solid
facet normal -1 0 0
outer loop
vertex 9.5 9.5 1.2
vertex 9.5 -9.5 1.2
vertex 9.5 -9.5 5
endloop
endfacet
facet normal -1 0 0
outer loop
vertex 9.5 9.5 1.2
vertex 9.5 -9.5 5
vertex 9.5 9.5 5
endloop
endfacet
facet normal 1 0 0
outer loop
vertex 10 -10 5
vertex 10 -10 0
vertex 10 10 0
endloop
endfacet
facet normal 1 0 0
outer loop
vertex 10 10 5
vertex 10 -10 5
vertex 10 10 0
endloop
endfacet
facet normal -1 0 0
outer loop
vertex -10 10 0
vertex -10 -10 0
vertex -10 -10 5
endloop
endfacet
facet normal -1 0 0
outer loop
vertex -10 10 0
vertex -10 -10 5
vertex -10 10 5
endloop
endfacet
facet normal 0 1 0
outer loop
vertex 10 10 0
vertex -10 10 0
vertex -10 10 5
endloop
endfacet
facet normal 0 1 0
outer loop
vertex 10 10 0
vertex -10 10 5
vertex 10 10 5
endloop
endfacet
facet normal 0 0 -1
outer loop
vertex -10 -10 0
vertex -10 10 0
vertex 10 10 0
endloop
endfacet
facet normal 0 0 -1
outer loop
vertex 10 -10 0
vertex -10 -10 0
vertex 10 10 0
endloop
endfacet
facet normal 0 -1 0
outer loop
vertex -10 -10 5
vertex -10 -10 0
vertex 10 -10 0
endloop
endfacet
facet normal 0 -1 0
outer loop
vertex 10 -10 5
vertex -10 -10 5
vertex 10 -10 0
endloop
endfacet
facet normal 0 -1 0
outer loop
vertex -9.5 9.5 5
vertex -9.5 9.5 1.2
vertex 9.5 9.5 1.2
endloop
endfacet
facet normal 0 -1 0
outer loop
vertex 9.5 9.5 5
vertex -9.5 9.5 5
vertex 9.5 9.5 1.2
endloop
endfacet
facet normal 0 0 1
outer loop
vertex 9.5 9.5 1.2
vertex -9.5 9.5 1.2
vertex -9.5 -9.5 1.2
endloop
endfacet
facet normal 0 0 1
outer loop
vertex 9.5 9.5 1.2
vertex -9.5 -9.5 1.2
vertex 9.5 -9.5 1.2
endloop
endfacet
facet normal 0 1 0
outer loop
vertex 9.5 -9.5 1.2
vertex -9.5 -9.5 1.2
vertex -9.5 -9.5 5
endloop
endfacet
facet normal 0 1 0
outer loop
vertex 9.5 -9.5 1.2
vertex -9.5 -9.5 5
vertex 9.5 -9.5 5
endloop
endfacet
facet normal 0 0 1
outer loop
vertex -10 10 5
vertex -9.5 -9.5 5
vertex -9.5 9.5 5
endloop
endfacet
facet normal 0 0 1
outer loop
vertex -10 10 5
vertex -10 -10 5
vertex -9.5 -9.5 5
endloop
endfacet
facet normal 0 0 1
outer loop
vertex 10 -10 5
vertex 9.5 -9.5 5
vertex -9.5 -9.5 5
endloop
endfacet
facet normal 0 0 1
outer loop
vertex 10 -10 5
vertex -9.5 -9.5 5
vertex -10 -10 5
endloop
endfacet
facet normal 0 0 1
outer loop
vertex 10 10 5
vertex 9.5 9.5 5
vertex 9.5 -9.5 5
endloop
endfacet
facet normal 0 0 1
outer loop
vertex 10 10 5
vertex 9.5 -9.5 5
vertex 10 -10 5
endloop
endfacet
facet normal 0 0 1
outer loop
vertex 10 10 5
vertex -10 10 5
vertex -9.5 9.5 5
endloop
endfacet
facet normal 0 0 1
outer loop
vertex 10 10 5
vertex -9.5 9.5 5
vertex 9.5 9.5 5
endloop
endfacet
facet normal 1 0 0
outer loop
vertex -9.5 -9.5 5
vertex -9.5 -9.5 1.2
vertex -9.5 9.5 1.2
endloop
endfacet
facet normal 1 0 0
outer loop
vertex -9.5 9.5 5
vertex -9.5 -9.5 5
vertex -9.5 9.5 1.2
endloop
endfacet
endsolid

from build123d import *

# Parameters (mm, degrees)
F0_W     = 20
F0_H     = 20
F1_DEPTH = 5
F2_T     = -0.5
F3_W     = 20
F3_H     = 20
F4_DEPTH = 1.2


with BuildPart() as f1:
    # F0 (on Top) → F1 (new body)
    with BuildSketch(Plane.XY):
        Rectangle(F0_W, F0_H)
    extrude(amount=F1_DEPTH)

    # F2
    f2_openings = [f1.faces().sort_by_distance(p)[0] for p in [
        (0, 0, 5),
        (0, 0, 0),
    ]]
    offset(amount=F2_T, openings=f2_openings)

    # F3 (on Top) → F4 (join)
    with BuildSketch(Plane.XY):
        Rectangle(F3_W, F3_H)
    extrude(amount=F4_DEPTH)


solid = f1.part
